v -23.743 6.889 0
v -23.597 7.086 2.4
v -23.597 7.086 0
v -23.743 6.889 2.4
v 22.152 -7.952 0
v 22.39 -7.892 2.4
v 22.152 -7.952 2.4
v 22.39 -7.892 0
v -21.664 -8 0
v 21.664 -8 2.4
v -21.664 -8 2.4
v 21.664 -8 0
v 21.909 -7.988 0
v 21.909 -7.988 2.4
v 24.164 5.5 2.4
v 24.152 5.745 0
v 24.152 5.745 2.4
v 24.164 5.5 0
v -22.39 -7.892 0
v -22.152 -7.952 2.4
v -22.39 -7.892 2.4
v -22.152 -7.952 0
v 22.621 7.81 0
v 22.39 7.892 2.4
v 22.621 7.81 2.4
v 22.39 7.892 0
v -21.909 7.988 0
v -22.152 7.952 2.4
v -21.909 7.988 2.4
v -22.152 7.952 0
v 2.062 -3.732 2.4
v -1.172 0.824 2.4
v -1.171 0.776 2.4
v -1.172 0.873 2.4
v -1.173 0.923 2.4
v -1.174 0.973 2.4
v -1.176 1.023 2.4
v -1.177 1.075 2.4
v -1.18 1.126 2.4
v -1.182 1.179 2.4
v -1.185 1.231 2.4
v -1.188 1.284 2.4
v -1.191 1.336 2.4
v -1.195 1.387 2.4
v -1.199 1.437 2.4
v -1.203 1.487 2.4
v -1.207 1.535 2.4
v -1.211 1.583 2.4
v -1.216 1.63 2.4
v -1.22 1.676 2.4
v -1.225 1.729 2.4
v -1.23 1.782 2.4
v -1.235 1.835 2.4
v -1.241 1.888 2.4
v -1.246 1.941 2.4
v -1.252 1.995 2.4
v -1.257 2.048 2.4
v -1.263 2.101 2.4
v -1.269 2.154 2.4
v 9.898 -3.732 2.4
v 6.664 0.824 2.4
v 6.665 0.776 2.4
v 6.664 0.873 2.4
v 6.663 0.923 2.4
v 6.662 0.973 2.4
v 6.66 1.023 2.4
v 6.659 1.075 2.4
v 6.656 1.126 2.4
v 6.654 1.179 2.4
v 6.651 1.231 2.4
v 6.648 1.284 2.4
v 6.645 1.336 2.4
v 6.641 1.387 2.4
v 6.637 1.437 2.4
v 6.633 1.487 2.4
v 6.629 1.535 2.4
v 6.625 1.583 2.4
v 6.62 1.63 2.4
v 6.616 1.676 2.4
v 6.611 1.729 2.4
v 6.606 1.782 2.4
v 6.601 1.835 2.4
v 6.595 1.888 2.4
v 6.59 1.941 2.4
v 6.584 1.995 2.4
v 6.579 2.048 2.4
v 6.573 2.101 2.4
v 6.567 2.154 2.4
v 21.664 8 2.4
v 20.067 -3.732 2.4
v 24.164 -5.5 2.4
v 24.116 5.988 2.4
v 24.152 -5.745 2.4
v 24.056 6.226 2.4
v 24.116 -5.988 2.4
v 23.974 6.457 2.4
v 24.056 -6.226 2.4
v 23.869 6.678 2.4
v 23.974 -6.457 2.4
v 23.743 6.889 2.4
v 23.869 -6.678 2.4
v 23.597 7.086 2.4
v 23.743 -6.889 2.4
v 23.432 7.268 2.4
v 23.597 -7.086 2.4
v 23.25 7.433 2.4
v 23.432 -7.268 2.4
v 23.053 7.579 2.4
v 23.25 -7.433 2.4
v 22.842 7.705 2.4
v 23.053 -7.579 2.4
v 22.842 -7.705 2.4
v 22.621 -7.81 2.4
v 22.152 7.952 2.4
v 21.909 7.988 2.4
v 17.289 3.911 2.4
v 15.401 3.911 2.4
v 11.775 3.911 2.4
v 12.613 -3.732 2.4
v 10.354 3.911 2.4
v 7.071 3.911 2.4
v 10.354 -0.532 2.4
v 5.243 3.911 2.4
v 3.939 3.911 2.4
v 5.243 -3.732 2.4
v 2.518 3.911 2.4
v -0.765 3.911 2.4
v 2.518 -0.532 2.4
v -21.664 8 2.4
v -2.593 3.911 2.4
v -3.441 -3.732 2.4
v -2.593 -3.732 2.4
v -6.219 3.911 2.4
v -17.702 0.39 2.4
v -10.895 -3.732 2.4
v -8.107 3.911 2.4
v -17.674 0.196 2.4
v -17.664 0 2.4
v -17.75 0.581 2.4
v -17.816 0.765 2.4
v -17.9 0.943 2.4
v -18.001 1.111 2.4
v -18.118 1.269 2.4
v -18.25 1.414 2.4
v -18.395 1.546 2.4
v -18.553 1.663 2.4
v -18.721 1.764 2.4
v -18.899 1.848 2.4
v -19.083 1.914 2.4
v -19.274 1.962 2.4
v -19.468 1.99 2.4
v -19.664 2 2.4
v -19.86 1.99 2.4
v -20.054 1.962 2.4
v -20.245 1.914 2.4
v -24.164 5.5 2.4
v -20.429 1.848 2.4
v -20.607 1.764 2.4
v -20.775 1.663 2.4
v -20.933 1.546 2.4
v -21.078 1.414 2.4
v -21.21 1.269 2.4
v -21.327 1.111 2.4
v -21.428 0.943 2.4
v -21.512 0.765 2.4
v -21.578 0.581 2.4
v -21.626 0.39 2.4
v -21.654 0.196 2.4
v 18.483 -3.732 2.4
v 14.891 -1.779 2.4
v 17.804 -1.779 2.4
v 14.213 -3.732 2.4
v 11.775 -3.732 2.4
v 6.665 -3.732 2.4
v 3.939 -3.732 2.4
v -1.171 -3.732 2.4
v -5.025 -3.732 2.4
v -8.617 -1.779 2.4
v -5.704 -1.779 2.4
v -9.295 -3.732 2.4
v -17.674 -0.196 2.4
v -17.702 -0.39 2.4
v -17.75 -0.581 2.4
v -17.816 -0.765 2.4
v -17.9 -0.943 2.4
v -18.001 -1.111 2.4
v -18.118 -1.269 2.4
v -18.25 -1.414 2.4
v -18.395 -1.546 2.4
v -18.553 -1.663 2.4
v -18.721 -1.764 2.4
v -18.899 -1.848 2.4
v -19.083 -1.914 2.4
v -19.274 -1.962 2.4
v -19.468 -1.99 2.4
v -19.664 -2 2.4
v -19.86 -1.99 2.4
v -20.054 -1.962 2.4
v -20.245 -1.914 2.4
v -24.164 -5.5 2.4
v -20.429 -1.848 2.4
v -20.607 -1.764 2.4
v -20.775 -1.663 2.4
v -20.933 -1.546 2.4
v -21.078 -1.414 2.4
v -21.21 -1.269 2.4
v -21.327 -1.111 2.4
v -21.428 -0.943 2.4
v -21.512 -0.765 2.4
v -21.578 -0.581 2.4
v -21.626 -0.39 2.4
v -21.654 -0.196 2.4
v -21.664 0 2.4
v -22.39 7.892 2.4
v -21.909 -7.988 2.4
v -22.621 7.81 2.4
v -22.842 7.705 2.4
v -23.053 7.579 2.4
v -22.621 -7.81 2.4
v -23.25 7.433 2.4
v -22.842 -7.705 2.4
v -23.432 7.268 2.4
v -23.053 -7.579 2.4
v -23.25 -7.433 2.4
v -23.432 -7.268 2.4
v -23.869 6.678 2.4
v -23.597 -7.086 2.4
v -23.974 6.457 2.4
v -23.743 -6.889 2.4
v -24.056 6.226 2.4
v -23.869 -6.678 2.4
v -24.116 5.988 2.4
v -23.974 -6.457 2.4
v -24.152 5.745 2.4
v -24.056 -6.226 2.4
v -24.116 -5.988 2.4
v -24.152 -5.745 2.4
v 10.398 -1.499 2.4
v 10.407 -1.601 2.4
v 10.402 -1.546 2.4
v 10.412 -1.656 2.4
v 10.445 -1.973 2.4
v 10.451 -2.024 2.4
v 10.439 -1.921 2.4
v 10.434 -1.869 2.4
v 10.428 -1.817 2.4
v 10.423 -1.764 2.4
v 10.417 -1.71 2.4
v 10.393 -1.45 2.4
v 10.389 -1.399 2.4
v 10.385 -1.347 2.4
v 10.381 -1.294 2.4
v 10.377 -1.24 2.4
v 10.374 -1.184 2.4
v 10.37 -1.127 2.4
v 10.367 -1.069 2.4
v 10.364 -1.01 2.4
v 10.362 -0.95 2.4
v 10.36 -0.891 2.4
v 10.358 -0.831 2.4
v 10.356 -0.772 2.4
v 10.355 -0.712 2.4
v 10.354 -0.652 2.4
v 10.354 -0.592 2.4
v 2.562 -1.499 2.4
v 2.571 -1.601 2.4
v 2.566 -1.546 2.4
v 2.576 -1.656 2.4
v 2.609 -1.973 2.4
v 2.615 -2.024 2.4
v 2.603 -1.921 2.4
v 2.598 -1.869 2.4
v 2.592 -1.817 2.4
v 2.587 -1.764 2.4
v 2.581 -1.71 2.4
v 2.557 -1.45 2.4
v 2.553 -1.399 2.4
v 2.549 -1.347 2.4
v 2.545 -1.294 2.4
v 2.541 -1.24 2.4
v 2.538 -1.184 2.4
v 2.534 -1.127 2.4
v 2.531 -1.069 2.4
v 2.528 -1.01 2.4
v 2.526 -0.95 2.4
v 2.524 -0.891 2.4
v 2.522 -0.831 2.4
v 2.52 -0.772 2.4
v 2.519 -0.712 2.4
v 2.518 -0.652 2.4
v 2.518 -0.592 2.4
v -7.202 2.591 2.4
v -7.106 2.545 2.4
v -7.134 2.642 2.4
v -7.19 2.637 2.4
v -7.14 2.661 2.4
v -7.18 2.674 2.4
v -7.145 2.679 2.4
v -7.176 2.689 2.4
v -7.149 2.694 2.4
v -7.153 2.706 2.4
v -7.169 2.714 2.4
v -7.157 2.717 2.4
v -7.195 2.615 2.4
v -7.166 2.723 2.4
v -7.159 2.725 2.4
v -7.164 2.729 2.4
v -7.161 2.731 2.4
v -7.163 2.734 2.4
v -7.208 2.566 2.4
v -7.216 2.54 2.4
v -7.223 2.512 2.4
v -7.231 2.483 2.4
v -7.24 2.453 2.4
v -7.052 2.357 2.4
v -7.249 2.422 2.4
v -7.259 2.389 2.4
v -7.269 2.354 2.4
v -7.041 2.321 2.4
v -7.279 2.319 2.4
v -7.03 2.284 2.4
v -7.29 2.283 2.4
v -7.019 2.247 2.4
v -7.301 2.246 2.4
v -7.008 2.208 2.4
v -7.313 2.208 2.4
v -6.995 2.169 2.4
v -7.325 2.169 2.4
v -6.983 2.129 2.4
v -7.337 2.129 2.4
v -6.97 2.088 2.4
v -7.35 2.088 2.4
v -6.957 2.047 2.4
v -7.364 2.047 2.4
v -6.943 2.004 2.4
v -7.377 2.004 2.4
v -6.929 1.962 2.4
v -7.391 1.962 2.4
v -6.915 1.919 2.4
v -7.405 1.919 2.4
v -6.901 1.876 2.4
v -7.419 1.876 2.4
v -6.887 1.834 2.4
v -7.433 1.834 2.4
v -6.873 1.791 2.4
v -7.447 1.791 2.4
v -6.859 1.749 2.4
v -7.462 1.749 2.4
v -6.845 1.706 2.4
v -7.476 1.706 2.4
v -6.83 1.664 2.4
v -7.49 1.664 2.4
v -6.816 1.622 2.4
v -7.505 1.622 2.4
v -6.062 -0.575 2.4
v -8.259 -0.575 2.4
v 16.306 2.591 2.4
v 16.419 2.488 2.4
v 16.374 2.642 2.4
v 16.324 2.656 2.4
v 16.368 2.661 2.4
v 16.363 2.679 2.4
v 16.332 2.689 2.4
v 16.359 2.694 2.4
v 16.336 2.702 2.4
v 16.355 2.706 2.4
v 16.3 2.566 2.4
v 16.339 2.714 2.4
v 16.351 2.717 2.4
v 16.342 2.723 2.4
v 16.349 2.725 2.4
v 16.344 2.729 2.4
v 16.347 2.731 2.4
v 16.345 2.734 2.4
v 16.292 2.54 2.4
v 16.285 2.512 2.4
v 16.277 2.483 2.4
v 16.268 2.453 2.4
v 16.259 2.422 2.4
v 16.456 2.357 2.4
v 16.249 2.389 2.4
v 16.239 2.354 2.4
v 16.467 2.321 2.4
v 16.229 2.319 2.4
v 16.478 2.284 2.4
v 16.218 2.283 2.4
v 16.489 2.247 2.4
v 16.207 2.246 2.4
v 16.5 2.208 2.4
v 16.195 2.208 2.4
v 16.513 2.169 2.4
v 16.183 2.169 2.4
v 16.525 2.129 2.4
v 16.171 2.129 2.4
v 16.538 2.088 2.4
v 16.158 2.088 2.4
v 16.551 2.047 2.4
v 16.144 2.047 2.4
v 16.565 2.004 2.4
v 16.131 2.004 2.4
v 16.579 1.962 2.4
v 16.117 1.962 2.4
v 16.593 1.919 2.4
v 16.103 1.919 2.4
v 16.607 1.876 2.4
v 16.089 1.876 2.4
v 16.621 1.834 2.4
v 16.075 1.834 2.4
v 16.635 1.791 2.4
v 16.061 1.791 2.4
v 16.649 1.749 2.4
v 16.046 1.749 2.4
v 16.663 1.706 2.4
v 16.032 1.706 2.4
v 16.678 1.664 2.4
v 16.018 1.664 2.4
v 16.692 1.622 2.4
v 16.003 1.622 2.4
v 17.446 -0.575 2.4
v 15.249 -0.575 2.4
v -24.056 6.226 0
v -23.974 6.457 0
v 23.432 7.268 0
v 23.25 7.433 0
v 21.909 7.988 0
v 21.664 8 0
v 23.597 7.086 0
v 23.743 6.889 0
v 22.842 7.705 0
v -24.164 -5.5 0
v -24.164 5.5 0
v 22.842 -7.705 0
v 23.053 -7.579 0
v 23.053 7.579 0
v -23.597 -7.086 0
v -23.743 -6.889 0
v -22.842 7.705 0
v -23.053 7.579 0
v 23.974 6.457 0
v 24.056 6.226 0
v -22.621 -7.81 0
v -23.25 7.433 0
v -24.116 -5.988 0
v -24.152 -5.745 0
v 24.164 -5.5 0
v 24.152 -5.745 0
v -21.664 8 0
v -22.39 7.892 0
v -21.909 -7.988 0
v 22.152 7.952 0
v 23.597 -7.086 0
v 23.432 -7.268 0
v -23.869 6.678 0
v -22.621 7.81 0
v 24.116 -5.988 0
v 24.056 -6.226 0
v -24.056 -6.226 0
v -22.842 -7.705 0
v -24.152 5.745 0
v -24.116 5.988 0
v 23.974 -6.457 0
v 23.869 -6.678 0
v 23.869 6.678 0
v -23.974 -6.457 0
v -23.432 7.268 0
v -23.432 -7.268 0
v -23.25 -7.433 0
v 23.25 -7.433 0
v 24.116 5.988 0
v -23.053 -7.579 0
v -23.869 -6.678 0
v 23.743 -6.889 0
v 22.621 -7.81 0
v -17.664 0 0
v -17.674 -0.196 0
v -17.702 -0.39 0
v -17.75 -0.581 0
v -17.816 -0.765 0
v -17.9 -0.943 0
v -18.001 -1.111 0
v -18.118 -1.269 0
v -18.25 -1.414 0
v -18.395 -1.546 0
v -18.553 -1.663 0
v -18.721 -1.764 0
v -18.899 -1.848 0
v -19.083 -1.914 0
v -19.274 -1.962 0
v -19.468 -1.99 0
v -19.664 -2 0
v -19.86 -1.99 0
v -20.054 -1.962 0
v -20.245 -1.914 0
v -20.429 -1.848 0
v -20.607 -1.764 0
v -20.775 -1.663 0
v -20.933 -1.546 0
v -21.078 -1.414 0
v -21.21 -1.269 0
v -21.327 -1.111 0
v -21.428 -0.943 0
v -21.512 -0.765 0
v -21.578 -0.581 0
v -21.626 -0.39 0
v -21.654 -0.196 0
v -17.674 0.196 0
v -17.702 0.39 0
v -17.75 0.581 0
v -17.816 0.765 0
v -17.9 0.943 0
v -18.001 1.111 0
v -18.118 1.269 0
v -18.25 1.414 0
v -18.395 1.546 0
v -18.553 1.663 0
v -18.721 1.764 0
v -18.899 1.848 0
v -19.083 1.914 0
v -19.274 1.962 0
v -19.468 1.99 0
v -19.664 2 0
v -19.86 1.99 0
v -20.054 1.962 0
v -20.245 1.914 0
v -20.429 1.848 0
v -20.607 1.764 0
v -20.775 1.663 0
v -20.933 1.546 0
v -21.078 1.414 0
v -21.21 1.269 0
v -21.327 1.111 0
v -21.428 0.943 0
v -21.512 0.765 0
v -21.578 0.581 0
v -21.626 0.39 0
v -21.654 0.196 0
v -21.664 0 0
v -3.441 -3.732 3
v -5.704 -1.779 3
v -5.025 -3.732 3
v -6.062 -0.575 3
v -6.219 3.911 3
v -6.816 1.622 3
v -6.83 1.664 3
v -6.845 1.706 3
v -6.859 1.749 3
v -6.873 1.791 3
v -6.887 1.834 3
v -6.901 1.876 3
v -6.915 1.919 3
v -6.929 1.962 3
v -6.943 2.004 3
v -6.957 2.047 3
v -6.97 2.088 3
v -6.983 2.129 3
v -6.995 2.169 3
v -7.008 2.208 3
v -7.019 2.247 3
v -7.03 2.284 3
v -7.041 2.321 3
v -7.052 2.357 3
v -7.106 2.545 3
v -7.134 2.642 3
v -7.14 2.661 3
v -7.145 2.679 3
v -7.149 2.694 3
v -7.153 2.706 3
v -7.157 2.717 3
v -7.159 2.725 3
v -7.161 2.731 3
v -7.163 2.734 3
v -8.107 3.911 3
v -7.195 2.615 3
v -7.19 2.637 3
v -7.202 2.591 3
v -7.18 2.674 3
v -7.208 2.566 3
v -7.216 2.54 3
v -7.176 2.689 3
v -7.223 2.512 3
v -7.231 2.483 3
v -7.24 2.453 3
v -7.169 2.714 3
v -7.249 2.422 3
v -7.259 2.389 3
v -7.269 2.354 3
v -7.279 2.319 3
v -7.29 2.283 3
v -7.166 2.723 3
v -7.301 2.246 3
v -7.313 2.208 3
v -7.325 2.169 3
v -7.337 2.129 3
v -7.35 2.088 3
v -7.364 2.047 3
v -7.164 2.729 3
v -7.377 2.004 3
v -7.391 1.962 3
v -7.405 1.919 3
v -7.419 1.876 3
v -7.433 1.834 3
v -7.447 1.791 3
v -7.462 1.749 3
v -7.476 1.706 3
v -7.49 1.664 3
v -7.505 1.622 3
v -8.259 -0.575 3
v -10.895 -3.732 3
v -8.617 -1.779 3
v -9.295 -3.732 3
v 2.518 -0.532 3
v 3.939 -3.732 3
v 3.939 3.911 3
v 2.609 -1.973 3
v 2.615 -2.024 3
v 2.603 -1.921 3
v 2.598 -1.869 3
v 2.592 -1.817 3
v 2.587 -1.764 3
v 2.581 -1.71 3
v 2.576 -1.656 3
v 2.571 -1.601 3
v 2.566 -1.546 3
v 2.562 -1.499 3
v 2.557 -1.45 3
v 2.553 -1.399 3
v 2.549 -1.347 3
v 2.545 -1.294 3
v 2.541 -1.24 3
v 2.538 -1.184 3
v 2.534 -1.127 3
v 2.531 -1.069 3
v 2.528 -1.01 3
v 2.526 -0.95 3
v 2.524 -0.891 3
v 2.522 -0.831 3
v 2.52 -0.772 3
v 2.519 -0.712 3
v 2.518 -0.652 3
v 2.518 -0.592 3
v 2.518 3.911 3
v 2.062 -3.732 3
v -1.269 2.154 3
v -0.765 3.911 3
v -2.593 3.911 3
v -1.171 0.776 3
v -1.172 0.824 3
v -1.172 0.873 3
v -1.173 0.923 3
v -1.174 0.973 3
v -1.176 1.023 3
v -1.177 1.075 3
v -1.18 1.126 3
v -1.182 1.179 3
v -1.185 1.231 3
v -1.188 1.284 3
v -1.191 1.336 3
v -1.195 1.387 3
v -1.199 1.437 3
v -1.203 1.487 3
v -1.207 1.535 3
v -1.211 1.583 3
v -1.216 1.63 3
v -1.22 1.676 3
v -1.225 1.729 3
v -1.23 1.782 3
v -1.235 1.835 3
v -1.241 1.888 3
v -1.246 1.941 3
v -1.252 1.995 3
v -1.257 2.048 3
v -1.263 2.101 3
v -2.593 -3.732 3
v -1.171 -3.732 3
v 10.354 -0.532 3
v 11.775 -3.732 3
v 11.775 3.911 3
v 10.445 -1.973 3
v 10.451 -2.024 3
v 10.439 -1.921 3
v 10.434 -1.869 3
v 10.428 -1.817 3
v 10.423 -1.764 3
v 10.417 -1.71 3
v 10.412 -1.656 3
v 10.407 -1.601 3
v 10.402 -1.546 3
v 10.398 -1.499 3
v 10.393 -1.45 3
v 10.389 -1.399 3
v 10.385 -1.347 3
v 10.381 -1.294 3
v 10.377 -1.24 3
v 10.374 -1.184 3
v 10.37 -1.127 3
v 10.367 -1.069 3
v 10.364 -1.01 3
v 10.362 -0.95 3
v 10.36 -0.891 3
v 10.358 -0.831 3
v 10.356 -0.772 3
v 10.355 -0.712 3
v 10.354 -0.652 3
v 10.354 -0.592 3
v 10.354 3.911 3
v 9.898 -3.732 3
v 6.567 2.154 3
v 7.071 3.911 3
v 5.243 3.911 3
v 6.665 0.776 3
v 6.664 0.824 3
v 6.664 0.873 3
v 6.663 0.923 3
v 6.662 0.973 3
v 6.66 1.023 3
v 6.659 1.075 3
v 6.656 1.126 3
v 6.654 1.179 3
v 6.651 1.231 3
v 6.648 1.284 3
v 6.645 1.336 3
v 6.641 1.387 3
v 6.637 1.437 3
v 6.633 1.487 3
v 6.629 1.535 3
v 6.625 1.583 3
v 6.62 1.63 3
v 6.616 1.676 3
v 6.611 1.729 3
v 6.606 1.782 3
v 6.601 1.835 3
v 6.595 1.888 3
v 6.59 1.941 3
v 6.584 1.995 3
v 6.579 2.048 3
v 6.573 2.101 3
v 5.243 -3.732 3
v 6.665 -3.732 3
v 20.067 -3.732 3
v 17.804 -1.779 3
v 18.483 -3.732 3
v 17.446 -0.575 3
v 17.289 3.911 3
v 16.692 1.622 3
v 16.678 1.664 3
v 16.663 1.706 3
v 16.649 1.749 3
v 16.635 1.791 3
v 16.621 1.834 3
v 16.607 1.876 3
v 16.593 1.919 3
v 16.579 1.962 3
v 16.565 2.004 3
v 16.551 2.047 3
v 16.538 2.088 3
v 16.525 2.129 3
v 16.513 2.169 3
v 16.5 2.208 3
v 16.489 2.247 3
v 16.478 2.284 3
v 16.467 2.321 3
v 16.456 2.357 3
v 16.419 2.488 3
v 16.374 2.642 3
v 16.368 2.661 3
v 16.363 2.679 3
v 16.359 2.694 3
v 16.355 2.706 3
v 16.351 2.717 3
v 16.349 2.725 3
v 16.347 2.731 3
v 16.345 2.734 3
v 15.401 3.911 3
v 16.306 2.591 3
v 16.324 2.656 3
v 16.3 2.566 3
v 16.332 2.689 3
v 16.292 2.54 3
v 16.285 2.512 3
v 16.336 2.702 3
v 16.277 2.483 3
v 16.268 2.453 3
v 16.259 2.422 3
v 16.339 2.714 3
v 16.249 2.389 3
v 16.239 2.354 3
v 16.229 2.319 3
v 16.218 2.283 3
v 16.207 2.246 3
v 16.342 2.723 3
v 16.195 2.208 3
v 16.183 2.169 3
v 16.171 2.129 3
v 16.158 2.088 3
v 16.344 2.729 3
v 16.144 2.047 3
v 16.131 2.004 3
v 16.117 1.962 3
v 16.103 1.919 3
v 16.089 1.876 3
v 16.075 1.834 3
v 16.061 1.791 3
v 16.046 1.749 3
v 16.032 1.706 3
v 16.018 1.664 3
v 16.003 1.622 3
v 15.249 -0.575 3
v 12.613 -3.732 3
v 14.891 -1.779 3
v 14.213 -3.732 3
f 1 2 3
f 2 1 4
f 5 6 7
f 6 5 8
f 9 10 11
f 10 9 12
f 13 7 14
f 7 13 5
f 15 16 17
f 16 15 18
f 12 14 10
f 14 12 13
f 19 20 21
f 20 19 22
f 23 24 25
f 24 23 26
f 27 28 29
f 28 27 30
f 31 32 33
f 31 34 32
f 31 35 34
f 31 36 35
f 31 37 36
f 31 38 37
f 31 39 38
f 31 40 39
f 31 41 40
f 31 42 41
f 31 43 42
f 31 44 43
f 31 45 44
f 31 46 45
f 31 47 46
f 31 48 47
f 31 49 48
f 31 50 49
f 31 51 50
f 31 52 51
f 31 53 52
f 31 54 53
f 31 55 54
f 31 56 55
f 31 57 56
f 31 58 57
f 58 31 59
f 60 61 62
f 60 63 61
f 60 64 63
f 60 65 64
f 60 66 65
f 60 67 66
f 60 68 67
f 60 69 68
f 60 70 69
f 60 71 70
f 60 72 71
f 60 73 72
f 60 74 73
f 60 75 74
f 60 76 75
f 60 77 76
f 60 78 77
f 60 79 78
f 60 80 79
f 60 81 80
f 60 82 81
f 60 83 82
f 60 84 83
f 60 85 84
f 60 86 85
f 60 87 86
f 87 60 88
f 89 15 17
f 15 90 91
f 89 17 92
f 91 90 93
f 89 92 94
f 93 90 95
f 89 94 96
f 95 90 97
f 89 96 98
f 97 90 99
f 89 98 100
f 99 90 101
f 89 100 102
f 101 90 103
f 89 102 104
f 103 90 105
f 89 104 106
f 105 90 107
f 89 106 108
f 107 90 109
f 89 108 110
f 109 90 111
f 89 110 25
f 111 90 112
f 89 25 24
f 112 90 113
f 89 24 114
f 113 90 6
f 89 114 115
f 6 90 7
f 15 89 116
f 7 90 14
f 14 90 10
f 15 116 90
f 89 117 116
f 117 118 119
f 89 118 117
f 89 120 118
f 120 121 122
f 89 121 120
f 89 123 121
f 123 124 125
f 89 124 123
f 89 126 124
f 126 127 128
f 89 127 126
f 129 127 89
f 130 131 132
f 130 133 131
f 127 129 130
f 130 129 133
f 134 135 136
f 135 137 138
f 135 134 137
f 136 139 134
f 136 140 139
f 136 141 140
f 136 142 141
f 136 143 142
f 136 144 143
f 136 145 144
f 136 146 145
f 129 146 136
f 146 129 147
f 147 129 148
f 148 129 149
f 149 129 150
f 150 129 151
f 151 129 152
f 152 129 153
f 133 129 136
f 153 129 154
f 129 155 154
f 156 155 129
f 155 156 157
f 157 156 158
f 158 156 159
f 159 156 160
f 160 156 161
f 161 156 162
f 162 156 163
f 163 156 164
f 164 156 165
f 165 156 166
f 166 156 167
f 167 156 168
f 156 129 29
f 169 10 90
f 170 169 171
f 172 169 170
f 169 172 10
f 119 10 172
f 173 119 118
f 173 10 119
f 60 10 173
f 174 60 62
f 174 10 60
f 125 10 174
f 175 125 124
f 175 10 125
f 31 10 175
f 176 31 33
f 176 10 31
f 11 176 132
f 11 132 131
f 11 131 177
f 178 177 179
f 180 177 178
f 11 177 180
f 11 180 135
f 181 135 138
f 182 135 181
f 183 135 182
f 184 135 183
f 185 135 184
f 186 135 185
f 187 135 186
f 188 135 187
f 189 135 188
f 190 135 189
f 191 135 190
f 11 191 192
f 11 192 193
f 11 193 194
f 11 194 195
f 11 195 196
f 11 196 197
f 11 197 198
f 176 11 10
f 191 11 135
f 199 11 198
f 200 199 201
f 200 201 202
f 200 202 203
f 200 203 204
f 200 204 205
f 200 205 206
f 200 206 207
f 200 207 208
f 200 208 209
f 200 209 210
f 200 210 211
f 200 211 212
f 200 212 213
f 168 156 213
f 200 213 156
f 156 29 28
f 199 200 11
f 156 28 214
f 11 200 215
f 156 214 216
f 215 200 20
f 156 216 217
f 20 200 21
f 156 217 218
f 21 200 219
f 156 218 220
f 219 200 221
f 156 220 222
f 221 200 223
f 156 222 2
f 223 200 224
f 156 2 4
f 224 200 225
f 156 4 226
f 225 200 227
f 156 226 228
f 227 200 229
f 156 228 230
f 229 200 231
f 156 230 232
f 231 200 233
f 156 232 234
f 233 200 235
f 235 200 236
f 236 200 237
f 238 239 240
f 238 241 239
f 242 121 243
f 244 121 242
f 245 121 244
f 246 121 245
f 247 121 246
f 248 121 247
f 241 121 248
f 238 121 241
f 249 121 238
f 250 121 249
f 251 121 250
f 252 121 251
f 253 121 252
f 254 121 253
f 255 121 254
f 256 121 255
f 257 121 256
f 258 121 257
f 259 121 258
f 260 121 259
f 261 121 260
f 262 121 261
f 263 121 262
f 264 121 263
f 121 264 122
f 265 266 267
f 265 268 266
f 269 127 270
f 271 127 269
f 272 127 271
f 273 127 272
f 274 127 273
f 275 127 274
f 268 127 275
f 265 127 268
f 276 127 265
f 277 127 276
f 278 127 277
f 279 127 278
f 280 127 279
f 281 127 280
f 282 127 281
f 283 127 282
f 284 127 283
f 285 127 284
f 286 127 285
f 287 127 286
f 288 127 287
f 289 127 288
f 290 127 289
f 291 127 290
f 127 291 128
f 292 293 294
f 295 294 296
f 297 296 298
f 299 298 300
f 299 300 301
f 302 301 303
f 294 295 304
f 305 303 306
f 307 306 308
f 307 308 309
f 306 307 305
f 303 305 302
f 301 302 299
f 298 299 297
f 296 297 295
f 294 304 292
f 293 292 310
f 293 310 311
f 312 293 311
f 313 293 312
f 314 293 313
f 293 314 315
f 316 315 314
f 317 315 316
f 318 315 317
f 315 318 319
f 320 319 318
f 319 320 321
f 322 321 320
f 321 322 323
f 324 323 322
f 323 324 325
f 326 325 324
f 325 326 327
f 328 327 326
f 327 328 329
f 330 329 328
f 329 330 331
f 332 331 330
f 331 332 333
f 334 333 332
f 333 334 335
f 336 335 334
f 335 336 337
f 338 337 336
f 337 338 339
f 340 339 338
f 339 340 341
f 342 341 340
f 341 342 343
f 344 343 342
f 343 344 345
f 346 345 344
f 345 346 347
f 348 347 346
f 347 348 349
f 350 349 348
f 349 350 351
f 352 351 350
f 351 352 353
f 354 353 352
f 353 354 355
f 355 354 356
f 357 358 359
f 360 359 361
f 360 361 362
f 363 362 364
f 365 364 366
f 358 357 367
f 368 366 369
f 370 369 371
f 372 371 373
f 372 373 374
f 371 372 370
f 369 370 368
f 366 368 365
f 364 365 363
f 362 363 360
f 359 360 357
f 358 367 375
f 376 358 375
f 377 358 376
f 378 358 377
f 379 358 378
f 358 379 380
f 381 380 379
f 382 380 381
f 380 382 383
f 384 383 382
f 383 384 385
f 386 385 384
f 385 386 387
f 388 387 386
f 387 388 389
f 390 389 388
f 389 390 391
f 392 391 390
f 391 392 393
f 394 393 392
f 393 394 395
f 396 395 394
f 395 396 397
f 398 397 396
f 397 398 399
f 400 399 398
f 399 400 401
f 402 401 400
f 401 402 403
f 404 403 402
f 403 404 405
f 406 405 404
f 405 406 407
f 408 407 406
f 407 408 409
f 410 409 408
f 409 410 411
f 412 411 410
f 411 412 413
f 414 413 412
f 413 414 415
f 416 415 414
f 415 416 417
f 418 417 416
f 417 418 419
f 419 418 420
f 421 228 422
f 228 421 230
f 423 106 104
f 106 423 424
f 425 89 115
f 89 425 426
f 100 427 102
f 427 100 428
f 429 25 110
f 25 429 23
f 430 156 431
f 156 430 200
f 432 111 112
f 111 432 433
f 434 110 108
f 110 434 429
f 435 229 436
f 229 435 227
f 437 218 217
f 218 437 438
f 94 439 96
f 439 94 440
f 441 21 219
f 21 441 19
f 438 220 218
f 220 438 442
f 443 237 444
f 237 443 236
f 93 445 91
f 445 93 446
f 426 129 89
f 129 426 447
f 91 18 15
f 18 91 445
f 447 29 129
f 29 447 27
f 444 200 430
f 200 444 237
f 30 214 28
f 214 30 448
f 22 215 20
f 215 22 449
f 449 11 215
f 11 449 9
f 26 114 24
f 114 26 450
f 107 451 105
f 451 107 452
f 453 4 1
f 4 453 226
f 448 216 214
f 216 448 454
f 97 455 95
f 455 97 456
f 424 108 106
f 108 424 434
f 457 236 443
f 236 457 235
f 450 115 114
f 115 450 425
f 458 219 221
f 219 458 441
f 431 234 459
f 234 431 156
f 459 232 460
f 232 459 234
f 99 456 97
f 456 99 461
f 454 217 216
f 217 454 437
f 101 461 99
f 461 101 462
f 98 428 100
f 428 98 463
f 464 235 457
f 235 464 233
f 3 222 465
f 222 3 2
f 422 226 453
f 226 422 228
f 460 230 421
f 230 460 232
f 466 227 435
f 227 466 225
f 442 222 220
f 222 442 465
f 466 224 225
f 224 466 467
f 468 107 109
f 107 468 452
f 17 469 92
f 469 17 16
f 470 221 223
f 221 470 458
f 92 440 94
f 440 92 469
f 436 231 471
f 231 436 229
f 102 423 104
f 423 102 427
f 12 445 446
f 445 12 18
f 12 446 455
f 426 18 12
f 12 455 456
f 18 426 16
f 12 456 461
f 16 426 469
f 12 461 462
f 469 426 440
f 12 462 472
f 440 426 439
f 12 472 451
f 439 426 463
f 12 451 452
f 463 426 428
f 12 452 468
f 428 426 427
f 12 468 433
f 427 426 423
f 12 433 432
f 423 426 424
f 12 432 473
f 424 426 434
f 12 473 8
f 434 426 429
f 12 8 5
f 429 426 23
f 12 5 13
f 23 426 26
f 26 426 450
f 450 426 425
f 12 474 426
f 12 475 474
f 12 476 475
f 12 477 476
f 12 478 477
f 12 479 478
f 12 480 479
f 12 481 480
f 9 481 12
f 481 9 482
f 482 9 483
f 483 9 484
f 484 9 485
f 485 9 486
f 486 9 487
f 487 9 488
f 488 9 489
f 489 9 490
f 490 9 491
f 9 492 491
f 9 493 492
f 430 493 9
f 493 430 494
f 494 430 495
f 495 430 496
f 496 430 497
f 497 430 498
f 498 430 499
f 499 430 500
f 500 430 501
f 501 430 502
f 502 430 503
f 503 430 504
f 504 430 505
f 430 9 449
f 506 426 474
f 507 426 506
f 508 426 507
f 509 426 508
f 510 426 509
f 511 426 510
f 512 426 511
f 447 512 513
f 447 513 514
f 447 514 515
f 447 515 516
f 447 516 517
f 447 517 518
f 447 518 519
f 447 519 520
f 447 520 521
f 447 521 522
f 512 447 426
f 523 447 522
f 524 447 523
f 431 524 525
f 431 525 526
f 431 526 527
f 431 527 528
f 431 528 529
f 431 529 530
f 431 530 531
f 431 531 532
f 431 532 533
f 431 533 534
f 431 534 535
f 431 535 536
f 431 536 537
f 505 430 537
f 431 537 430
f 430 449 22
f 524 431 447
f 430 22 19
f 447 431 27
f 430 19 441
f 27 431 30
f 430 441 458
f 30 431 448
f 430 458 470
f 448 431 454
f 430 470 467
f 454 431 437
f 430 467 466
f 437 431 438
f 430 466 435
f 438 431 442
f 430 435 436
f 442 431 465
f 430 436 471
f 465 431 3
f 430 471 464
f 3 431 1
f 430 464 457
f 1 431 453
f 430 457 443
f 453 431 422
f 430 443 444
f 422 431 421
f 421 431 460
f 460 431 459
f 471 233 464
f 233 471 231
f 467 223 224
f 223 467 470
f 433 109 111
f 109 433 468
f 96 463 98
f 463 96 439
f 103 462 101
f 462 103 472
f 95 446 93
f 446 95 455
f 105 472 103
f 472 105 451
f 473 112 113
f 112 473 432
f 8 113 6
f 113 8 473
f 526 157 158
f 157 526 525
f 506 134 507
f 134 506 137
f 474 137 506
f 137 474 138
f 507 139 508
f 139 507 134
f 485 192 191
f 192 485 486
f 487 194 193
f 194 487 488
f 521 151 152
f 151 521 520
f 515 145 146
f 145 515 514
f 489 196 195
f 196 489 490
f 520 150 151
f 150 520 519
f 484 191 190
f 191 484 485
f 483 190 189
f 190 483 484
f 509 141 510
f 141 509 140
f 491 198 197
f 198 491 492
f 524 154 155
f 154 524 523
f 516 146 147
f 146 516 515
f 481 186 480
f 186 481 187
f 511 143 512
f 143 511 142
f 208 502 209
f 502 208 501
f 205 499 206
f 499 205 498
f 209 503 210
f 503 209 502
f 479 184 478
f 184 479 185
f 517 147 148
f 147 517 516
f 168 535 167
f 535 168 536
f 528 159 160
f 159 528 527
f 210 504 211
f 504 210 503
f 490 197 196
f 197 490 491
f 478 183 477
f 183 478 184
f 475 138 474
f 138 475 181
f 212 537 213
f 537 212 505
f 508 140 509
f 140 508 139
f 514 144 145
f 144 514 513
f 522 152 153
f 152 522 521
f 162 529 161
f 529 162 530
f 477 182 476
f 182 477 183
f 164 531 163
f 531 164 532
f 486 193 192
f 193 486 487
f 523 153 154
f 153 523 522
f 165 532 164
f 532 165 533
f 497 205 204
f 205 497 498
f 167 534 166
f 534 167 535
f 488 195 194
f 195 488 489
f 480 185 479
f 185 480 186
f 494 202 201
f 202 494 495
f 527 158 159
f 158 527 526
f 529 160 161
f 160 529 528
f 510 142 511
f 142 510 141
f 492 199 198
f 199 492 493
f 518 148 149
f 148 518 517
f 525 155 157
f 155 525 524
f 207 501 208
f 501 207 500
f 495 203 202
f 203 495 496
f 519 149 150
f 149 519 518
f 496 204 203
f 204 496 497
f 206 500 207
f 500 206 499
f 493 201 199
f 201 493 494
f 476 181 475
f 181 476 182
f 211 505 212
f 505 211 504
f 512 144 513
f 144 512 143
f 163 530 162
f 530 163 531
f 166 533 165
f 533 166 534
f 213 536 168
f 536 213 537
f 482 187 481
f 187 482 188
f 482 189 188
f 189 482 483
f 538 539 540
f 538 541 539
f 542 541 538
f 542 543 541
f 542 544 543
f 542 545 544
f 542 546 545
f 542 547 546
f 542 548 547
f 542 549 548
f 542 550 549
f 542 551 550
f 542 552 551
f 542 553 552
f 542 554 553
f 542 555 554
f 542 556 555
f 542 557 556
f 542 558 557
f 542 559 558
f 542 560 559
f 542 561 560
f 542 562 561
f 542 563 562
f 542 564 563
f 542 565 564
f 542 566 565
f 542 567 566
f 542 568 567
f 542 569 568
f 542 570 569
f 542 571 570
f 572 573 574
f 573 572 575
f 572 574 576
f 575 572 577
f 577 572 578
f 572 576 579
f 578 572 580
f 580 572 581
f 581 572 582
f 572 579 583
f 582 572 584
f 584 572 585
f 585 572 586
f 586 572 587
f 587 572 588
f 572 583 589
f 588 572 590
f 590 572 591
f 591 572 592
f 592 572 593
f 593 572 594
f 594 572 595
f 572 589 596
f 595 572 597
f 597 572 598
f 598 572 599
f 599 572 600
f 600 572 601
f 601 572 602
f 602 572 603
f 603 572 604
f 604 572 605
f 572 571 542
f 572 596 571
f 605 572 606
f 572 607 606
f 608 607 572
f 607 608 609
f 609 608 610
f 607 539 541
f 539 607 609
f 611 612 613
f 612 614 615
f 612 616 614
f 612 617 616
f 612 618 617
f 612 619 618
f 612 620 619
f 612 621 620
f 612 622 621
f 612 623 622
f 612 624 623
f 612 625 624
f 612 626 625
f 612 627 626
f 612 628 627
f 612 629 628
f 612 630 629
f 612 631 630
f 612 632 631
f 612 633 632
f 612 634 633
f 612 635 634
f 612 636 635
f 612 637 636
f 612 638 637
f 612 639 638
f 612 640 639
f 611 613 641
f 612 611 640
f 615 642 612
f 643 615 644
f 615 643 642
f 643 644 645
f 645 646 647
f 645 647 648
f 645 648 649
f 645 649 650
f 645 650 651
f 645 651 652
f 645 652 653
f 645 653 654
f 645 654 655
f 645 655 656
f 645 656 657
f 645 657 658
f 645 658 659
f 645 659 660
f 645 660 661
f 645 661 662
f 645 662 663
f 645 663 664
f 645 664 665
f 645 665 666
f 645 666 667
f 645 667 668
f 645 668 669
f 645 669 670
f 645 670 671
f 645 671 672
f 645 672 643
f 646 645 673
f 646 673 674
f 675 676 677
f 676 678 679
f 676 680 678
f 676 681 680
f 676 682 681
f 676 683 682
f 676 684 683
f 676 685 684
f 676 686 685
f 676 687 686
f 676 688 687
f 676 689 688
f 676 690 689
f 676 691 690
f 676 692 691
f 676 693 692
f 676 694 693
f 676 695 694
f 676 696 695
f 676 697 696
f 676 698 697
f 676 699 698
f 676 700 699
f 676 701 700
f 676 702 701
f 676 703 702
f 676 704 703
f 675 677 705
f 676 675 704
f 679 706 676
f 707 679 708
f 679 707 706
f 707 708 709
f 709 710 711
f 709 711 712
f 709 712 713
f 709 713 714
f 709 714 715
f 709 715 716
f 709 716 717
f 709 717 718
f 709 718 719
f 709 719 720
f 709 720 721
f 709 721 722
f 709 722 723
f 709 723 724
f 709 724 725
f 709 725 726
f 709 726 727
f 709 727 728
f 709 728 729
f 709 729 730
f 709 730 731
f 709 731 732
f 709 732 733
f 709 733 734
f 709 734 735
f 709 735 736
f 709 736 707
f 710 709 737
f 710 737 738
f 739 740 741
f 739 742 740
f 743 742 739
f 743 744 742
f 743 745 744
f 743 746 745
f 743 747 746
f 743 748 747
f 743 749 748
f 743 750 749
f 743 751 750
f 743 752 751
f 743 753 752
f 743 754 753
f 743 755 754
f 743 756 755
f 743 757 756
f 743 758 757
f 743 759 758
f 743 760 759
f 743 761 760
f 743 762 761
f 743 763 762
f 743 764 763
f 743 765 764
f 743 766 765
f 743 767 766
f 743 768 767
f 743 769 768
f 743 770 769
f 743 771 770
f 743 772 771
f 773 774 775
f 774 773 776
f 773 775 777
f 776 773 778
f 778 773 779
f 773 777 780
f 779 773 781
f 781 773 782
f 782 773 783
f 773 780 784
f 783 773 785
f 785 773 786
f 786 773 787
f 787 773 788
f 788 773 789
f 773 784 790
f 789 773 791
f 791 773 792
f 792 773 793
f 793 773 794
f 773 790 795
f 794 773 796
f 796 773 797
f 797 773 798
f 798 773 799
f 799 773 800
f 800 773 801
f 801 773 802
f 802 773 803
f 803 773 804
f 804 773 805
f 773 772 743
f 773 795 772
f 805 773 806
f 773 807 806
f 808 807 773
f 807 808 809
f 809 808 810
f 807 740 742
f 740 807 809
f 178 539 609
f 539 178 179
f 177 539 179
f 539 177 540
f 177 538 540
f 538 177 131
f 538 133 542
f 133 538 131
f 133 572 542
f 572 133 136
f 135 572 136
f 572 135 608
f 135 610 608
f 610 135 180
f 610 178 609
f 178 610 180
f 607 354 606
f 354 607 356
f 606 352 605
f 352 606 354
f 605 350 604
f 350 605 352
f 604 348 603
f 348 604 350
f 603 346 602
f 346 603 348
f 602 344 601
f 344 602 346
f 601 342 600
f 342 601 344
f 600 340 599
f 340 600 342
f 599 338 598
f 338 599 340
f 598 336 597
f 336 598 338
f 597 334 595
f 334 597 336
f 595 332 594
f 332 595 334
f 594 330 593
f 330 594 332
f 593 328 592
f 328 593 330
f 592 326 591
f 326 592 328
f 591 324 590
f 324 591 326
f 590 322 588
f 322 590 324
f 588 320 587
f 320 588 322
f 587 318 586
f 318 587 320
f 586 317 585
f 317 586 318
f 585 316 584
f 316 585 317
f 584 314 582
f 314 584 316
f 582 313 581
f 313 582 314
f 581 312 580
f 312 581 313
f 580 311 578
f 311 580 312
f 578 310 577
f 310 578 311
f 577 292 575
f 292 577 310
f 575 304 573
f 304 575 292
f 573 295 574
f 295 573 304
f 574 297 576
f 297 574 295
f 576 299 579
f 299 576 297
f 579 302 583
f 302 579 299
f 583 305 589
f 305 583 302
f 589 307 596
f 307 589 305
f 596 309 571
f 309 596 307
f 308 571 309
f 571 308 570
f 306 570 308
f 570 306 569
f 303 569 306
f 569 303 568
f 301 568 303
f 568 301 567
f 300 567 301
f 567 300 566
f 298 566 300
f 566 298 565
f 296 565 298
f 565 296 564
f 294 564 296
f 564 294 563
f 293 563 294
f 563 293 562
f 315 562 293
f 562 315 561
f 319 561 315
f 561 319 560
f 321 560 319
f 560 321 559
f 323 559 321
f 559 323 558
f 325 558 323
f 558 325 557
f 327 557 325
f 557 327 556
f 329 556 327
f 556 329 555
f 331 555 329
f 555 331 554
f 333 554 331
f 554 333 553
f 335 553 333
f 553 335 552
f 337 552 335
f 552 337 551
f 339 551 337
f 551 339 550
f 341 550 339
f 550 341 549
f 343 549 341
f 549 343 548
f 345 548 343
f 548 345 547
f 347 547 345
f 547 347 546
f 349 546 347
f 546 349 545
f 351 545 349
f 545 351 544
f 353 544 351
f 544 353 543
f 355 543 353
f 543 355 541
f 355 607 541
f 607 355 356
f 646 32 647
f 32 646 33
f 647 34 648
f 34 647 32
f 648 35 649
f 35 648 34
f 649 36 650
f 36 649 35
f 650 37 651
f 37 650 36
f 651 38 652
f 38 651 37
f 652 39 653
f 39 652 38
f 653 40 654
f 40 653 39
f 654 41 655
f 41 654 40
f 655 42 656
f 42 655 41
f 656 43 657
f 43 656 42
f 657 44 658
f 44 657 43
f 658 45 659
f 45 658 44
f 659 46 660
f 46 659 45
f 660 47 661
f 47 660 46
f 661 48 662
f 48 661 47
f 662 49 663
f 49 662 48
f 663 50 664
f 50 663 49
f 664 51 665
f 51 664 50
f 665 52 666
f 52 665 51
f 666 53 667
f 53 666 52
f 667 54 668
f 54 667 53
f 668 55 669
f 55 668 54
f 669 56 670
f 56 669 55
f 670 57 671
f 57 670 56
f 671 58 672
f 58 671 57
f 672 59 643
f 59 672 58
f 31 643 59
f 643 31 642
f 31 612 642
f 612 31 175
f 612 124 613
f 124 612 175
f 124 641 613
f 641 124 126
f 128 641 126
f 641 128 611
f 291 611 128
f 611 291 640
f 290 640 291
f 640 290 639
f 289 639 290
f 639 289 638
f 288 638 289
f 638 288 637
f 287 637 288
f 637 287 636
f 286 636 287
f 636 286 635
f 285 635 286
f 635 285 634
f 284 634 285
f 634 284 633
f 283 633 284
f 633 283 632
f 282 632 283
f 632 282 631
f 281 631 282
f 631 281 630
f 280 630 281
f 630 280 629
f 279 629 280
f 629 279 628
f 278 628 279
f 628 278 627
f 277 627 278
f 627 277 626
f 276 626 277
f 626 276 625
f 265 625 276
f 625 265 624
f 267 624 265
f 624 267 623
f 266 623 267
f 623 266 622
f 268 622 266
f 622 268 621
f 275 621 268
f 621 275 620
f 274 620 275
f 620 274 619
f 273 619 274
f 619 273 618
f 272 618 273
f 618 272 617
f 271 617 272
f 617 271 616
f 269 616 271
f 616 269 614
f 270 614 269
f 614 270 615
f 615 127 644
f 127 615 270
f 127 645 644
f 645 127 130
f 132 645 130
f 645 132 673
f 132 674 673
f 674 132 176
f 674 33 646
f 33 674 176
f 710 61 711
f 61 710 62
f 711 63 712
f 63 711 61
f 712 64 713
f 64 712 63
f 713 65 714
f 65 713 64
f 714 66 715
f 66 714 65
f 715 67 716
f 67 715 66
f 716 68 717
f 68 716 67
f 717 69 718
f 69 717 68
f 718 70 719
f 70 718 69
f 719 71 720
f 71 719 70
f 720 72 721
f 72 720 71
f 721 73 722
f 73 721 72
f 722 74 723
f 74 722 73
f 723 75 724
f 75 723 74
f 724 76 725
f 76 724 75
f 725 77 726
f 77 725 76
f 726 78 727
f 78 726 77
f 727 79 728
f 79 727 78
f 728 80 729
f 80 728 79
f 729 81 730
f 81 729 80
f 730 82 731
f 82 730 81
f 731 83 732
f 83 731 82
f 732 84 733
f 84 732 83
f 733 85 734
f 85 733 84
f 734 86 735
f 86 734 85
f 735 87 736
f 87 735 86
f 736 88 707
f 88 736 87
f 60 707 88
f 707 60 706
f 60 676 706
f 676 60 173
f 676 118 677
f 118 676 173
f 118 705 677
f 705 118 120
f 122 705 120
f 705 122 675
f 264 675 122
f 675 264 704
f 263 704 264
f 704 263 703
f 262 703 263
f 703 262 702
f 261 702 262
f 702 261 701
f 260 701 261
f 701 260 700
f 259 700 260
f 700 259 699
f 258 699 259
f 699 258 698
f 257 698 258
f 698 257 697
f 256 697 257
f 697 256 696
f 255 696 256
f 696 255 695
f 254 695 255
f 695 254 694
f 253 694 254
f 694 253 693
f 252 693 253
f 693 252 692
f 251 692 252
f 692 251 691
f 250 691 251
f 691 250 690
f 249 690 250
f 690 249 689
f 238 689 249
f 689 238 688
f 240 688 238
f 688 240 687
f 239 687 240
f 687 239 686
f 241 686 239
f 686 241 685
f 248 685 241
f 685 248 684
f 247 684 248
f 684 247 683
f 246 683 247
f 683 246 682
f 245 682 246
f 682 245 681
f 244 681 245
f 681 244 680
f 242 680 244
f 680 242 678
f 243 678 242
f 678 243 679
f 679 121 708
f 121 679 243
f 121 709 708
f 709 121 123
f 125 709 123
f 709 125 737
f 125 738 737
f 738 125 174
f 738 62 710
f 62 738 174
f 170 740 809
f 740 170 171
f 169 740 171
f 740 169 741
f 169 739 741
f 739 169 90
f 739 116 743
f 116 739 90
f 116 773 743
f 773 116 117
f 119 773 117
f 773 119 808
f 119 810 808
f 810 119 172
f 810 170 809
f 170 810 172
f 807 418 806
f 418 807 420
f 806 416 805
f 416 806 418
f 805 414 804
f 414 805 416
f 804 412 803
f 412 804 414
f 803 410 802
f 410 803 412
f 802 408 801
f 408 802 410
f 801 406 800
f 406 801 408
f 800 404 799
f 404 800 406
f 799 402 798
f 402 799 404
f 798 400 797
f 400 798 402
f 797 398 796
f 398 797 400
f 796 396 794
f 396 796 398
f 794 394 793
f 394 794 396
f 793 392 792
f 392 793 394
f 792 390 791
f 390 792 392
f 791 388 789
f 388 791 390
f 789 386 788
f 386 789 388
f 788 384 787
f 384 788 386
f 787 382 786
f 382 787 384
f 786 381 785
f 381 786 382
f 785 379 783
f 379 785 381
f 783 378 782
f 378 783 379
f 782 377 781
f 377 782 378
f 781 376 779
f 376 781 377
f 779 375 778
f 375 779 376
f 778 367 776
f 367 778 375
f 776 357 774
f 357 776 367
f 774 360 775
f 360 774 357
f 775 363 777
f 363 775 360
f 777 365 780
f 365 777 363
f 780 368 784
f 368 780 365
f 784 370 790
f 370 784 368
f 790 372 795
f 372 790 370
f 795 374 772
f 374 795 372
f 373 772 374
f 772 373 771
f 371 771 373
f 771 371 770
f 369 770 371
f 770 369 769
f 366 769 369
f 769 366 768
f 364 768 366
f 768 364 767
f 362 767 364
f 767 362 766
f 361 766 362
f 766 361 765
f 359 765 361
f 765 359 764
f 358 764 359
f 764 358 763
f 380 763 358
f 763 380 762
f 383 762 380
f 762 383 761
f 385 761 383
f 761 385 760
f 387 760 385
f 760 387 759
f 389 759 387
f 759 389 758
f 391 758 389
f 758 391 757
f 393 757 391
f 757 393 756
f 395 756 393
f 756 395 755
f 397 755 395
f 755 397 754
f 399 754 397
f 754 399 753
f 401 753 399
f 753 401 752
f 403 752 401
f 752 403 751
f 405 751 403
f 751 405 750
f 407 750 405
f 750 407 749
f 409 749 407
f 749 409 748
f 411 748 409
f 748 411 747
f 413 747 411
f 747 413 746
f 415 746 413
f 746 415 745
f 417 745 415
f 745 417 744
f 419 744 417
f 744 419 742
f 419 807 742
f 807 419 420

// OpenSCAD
// file: lib/plate.scad
// ---------------------------------------------------------------------------
// plate.scad — shared geometry for the two-tone product line.
// Every part in this folder is a rounded plate plus raised text, so the whole
// catalogue is one filament change away from looking multi-colour.
// ---------------------------------------------------------------------------

$fn = 64;

// Glyph advances for Liberation Sans Bold, in multiples of the text size.
// Measured by rendering "HxH" against "HH" at size 100, because OpenSCAD 2021
// cannot measure a string at runtime. Swap the font and these go stale — the
// plate grows or the text hangs off the edge, so re-measure if you change it.
ADV_CHARS = "ABCDEFGHIJKLMNOPQRSTUVWXYZabcdefghijklmnopqrstuvwxyz0123456789 -.,'&/#+";
ADV_VALS = [
    0.979, 0.979, 0.979, 0.979, 0.905, 0.828, 1.055, 0.979, 0.377, 0.754,
    0.979, 0.828, 1.130, 0.979, 1.055, 0.905, 1.055, 0.979, 0.905, 0.828,
    0.979, 0.905, 1.280, 0.905, 0.905, 0.828,
    0.754, 0.828, 0.754, 0.828, 0.754, 0.452, 0.828, 0.828, 0.377, 0.377,
    0.754, 0.377, 1.206, 0.828, 0.828, 0.828, 0.828, 0.528, 0.754, 0.452,
    0.828, 0.754, 1.055, 0.754, 0.754, 0.678,
    0.754, 0.754, 0.754, 0.754, 0.754, 0.754, 0.754, 0.754, 0.754, 0.754,
    0.377, 0.452, 0.377, 0.377, 0.323, 0.979, 0.377, 0.754, 0.792
];

// Unknown glyphs fall back to the widest measured advance, so an accent or a
// symbol makes the plate too big rather than too small.
function char_adv(c) = let (i = search(c, ADV_CHARS)) (i == [] ? 1.28 : ADV_VALS[i[0]]);

function text_width(txt, size, i = 0) =
    i >= len(txt) ? 0 : char_adv(txt[i]) * size + text_width(txt, size, i + 1);

function plate_width(txt, size, pad, min_w) =
    max(min_w, text_width(txt, size) + 2 * pad);

// Largest text size that fits a fixed-width space — used by the round parts,
// whose plate cannot simply grow to fit a long name.
function fit_size(txt, max_size, avail_w) =
    min(max_size, avail_w / max(text_width(txt, 1), 0.001));

// Layer the slicer must pause before, 1-indexed, for a given base height.
function pause_layer(base_h, layer_h) = floor(base_h / layer_h + 0.5) + 1;

module rounded_plate(w, d, r, h) {
    linear_extrude(height = h)
        offset(r = r)
            square([max(w - 2 * r, 0.01), max(d - 2 * r, 0.01)], center = true);
}

module raised_text(txt, size, h, z, font, spacing = 1.0) {
    translate([0, 0, z])
        linear_extrude(height = h)
            text(txt, size = size, font = font, spacing = spacing,
                 halign = "center", valign = "center");
}

module hang_hole(x, y, z, dia, h) {
    translate([x, y, z - 1])
        cylinder(h = h + 2, d = dia);
}

module report(label, w, d, base_h, text_h, layer_h) {
    echo(str(label, ": ", w, " x ", d, " x ", base_h + text_h,
             " mm  |  swap filament before layer ", pause_layer(base_h, layer_h),
             " (Z = ", base_h, " mm)"));
}

// The name sign lives here so that name_sign.scad and batch.scad build the
// identical part from one definition.
module name_sign(name, text_size = 14, base_h = 3.0, text_h = 0.8, pad = 9,
                 corner_r = 3, min_width = 60,
                 font = "Liberation Sans:style=Bold", part = "all") {
    w = plate_width(name, text_size, pad, min_width);
    d = text_size + 2 * pad;
    if (part == "all" || part == "base") rounded_plate(w, d, corner_r, base_h);
    if (part == "all" || part == "text") raised_text(name, text_size, text_h, base_h, font);
}
// main file
// ---------------------------------------------------------------------------
// keychain.scad — personalised keychain, sold in sets of five.
//
//   openscad -o anna.stl -D 'name="ANNA"' keychain.scad
//
// Set of 5 sells for ~€14 at ~28 g and ~1.4 h for the whole set.
// ---------------------------------------------------------------------------
include <lib/plate.scad>

name        = "ANNA";
font        = "Liberation Sans:style=Bold";
text_size   = 8;
base_h      = 2.4;
text_h      = 0.6;                // 3 layers at 0.2 mm
pad         = 4;
corner_r    = 2.5;
min_width   = 26;
hole_d      = 4;                  // fits a standard split ring
hole_wall   = 2.5;
layer_h     = 0.2;
part        = "all";

ring_zone = hole_d + 2 * hole_wall;
text_w    = plate_width(name, text_size, pad, min_width);
w         = text_w + ring_zone;
d         = max(text_size + 2 * pad, ring_zone);
hole_x    = -w / 2 + ring_zone / 2;

module body() {
    difference() {
        rounded_plate(w, d, corner_r, base_h);
        hang_hole(hole_x, 0, 0, hole_d, base_h);
    }
}

if (part == "all" || part == "base") body();
if (part == "all" || part == "text")
    translate([ring_zone / 2, 0, 0])
        raised_text(name, text_size, text_h, base_h, font);

report("Keychain", w, d, base_h, text_h, layer_h);
